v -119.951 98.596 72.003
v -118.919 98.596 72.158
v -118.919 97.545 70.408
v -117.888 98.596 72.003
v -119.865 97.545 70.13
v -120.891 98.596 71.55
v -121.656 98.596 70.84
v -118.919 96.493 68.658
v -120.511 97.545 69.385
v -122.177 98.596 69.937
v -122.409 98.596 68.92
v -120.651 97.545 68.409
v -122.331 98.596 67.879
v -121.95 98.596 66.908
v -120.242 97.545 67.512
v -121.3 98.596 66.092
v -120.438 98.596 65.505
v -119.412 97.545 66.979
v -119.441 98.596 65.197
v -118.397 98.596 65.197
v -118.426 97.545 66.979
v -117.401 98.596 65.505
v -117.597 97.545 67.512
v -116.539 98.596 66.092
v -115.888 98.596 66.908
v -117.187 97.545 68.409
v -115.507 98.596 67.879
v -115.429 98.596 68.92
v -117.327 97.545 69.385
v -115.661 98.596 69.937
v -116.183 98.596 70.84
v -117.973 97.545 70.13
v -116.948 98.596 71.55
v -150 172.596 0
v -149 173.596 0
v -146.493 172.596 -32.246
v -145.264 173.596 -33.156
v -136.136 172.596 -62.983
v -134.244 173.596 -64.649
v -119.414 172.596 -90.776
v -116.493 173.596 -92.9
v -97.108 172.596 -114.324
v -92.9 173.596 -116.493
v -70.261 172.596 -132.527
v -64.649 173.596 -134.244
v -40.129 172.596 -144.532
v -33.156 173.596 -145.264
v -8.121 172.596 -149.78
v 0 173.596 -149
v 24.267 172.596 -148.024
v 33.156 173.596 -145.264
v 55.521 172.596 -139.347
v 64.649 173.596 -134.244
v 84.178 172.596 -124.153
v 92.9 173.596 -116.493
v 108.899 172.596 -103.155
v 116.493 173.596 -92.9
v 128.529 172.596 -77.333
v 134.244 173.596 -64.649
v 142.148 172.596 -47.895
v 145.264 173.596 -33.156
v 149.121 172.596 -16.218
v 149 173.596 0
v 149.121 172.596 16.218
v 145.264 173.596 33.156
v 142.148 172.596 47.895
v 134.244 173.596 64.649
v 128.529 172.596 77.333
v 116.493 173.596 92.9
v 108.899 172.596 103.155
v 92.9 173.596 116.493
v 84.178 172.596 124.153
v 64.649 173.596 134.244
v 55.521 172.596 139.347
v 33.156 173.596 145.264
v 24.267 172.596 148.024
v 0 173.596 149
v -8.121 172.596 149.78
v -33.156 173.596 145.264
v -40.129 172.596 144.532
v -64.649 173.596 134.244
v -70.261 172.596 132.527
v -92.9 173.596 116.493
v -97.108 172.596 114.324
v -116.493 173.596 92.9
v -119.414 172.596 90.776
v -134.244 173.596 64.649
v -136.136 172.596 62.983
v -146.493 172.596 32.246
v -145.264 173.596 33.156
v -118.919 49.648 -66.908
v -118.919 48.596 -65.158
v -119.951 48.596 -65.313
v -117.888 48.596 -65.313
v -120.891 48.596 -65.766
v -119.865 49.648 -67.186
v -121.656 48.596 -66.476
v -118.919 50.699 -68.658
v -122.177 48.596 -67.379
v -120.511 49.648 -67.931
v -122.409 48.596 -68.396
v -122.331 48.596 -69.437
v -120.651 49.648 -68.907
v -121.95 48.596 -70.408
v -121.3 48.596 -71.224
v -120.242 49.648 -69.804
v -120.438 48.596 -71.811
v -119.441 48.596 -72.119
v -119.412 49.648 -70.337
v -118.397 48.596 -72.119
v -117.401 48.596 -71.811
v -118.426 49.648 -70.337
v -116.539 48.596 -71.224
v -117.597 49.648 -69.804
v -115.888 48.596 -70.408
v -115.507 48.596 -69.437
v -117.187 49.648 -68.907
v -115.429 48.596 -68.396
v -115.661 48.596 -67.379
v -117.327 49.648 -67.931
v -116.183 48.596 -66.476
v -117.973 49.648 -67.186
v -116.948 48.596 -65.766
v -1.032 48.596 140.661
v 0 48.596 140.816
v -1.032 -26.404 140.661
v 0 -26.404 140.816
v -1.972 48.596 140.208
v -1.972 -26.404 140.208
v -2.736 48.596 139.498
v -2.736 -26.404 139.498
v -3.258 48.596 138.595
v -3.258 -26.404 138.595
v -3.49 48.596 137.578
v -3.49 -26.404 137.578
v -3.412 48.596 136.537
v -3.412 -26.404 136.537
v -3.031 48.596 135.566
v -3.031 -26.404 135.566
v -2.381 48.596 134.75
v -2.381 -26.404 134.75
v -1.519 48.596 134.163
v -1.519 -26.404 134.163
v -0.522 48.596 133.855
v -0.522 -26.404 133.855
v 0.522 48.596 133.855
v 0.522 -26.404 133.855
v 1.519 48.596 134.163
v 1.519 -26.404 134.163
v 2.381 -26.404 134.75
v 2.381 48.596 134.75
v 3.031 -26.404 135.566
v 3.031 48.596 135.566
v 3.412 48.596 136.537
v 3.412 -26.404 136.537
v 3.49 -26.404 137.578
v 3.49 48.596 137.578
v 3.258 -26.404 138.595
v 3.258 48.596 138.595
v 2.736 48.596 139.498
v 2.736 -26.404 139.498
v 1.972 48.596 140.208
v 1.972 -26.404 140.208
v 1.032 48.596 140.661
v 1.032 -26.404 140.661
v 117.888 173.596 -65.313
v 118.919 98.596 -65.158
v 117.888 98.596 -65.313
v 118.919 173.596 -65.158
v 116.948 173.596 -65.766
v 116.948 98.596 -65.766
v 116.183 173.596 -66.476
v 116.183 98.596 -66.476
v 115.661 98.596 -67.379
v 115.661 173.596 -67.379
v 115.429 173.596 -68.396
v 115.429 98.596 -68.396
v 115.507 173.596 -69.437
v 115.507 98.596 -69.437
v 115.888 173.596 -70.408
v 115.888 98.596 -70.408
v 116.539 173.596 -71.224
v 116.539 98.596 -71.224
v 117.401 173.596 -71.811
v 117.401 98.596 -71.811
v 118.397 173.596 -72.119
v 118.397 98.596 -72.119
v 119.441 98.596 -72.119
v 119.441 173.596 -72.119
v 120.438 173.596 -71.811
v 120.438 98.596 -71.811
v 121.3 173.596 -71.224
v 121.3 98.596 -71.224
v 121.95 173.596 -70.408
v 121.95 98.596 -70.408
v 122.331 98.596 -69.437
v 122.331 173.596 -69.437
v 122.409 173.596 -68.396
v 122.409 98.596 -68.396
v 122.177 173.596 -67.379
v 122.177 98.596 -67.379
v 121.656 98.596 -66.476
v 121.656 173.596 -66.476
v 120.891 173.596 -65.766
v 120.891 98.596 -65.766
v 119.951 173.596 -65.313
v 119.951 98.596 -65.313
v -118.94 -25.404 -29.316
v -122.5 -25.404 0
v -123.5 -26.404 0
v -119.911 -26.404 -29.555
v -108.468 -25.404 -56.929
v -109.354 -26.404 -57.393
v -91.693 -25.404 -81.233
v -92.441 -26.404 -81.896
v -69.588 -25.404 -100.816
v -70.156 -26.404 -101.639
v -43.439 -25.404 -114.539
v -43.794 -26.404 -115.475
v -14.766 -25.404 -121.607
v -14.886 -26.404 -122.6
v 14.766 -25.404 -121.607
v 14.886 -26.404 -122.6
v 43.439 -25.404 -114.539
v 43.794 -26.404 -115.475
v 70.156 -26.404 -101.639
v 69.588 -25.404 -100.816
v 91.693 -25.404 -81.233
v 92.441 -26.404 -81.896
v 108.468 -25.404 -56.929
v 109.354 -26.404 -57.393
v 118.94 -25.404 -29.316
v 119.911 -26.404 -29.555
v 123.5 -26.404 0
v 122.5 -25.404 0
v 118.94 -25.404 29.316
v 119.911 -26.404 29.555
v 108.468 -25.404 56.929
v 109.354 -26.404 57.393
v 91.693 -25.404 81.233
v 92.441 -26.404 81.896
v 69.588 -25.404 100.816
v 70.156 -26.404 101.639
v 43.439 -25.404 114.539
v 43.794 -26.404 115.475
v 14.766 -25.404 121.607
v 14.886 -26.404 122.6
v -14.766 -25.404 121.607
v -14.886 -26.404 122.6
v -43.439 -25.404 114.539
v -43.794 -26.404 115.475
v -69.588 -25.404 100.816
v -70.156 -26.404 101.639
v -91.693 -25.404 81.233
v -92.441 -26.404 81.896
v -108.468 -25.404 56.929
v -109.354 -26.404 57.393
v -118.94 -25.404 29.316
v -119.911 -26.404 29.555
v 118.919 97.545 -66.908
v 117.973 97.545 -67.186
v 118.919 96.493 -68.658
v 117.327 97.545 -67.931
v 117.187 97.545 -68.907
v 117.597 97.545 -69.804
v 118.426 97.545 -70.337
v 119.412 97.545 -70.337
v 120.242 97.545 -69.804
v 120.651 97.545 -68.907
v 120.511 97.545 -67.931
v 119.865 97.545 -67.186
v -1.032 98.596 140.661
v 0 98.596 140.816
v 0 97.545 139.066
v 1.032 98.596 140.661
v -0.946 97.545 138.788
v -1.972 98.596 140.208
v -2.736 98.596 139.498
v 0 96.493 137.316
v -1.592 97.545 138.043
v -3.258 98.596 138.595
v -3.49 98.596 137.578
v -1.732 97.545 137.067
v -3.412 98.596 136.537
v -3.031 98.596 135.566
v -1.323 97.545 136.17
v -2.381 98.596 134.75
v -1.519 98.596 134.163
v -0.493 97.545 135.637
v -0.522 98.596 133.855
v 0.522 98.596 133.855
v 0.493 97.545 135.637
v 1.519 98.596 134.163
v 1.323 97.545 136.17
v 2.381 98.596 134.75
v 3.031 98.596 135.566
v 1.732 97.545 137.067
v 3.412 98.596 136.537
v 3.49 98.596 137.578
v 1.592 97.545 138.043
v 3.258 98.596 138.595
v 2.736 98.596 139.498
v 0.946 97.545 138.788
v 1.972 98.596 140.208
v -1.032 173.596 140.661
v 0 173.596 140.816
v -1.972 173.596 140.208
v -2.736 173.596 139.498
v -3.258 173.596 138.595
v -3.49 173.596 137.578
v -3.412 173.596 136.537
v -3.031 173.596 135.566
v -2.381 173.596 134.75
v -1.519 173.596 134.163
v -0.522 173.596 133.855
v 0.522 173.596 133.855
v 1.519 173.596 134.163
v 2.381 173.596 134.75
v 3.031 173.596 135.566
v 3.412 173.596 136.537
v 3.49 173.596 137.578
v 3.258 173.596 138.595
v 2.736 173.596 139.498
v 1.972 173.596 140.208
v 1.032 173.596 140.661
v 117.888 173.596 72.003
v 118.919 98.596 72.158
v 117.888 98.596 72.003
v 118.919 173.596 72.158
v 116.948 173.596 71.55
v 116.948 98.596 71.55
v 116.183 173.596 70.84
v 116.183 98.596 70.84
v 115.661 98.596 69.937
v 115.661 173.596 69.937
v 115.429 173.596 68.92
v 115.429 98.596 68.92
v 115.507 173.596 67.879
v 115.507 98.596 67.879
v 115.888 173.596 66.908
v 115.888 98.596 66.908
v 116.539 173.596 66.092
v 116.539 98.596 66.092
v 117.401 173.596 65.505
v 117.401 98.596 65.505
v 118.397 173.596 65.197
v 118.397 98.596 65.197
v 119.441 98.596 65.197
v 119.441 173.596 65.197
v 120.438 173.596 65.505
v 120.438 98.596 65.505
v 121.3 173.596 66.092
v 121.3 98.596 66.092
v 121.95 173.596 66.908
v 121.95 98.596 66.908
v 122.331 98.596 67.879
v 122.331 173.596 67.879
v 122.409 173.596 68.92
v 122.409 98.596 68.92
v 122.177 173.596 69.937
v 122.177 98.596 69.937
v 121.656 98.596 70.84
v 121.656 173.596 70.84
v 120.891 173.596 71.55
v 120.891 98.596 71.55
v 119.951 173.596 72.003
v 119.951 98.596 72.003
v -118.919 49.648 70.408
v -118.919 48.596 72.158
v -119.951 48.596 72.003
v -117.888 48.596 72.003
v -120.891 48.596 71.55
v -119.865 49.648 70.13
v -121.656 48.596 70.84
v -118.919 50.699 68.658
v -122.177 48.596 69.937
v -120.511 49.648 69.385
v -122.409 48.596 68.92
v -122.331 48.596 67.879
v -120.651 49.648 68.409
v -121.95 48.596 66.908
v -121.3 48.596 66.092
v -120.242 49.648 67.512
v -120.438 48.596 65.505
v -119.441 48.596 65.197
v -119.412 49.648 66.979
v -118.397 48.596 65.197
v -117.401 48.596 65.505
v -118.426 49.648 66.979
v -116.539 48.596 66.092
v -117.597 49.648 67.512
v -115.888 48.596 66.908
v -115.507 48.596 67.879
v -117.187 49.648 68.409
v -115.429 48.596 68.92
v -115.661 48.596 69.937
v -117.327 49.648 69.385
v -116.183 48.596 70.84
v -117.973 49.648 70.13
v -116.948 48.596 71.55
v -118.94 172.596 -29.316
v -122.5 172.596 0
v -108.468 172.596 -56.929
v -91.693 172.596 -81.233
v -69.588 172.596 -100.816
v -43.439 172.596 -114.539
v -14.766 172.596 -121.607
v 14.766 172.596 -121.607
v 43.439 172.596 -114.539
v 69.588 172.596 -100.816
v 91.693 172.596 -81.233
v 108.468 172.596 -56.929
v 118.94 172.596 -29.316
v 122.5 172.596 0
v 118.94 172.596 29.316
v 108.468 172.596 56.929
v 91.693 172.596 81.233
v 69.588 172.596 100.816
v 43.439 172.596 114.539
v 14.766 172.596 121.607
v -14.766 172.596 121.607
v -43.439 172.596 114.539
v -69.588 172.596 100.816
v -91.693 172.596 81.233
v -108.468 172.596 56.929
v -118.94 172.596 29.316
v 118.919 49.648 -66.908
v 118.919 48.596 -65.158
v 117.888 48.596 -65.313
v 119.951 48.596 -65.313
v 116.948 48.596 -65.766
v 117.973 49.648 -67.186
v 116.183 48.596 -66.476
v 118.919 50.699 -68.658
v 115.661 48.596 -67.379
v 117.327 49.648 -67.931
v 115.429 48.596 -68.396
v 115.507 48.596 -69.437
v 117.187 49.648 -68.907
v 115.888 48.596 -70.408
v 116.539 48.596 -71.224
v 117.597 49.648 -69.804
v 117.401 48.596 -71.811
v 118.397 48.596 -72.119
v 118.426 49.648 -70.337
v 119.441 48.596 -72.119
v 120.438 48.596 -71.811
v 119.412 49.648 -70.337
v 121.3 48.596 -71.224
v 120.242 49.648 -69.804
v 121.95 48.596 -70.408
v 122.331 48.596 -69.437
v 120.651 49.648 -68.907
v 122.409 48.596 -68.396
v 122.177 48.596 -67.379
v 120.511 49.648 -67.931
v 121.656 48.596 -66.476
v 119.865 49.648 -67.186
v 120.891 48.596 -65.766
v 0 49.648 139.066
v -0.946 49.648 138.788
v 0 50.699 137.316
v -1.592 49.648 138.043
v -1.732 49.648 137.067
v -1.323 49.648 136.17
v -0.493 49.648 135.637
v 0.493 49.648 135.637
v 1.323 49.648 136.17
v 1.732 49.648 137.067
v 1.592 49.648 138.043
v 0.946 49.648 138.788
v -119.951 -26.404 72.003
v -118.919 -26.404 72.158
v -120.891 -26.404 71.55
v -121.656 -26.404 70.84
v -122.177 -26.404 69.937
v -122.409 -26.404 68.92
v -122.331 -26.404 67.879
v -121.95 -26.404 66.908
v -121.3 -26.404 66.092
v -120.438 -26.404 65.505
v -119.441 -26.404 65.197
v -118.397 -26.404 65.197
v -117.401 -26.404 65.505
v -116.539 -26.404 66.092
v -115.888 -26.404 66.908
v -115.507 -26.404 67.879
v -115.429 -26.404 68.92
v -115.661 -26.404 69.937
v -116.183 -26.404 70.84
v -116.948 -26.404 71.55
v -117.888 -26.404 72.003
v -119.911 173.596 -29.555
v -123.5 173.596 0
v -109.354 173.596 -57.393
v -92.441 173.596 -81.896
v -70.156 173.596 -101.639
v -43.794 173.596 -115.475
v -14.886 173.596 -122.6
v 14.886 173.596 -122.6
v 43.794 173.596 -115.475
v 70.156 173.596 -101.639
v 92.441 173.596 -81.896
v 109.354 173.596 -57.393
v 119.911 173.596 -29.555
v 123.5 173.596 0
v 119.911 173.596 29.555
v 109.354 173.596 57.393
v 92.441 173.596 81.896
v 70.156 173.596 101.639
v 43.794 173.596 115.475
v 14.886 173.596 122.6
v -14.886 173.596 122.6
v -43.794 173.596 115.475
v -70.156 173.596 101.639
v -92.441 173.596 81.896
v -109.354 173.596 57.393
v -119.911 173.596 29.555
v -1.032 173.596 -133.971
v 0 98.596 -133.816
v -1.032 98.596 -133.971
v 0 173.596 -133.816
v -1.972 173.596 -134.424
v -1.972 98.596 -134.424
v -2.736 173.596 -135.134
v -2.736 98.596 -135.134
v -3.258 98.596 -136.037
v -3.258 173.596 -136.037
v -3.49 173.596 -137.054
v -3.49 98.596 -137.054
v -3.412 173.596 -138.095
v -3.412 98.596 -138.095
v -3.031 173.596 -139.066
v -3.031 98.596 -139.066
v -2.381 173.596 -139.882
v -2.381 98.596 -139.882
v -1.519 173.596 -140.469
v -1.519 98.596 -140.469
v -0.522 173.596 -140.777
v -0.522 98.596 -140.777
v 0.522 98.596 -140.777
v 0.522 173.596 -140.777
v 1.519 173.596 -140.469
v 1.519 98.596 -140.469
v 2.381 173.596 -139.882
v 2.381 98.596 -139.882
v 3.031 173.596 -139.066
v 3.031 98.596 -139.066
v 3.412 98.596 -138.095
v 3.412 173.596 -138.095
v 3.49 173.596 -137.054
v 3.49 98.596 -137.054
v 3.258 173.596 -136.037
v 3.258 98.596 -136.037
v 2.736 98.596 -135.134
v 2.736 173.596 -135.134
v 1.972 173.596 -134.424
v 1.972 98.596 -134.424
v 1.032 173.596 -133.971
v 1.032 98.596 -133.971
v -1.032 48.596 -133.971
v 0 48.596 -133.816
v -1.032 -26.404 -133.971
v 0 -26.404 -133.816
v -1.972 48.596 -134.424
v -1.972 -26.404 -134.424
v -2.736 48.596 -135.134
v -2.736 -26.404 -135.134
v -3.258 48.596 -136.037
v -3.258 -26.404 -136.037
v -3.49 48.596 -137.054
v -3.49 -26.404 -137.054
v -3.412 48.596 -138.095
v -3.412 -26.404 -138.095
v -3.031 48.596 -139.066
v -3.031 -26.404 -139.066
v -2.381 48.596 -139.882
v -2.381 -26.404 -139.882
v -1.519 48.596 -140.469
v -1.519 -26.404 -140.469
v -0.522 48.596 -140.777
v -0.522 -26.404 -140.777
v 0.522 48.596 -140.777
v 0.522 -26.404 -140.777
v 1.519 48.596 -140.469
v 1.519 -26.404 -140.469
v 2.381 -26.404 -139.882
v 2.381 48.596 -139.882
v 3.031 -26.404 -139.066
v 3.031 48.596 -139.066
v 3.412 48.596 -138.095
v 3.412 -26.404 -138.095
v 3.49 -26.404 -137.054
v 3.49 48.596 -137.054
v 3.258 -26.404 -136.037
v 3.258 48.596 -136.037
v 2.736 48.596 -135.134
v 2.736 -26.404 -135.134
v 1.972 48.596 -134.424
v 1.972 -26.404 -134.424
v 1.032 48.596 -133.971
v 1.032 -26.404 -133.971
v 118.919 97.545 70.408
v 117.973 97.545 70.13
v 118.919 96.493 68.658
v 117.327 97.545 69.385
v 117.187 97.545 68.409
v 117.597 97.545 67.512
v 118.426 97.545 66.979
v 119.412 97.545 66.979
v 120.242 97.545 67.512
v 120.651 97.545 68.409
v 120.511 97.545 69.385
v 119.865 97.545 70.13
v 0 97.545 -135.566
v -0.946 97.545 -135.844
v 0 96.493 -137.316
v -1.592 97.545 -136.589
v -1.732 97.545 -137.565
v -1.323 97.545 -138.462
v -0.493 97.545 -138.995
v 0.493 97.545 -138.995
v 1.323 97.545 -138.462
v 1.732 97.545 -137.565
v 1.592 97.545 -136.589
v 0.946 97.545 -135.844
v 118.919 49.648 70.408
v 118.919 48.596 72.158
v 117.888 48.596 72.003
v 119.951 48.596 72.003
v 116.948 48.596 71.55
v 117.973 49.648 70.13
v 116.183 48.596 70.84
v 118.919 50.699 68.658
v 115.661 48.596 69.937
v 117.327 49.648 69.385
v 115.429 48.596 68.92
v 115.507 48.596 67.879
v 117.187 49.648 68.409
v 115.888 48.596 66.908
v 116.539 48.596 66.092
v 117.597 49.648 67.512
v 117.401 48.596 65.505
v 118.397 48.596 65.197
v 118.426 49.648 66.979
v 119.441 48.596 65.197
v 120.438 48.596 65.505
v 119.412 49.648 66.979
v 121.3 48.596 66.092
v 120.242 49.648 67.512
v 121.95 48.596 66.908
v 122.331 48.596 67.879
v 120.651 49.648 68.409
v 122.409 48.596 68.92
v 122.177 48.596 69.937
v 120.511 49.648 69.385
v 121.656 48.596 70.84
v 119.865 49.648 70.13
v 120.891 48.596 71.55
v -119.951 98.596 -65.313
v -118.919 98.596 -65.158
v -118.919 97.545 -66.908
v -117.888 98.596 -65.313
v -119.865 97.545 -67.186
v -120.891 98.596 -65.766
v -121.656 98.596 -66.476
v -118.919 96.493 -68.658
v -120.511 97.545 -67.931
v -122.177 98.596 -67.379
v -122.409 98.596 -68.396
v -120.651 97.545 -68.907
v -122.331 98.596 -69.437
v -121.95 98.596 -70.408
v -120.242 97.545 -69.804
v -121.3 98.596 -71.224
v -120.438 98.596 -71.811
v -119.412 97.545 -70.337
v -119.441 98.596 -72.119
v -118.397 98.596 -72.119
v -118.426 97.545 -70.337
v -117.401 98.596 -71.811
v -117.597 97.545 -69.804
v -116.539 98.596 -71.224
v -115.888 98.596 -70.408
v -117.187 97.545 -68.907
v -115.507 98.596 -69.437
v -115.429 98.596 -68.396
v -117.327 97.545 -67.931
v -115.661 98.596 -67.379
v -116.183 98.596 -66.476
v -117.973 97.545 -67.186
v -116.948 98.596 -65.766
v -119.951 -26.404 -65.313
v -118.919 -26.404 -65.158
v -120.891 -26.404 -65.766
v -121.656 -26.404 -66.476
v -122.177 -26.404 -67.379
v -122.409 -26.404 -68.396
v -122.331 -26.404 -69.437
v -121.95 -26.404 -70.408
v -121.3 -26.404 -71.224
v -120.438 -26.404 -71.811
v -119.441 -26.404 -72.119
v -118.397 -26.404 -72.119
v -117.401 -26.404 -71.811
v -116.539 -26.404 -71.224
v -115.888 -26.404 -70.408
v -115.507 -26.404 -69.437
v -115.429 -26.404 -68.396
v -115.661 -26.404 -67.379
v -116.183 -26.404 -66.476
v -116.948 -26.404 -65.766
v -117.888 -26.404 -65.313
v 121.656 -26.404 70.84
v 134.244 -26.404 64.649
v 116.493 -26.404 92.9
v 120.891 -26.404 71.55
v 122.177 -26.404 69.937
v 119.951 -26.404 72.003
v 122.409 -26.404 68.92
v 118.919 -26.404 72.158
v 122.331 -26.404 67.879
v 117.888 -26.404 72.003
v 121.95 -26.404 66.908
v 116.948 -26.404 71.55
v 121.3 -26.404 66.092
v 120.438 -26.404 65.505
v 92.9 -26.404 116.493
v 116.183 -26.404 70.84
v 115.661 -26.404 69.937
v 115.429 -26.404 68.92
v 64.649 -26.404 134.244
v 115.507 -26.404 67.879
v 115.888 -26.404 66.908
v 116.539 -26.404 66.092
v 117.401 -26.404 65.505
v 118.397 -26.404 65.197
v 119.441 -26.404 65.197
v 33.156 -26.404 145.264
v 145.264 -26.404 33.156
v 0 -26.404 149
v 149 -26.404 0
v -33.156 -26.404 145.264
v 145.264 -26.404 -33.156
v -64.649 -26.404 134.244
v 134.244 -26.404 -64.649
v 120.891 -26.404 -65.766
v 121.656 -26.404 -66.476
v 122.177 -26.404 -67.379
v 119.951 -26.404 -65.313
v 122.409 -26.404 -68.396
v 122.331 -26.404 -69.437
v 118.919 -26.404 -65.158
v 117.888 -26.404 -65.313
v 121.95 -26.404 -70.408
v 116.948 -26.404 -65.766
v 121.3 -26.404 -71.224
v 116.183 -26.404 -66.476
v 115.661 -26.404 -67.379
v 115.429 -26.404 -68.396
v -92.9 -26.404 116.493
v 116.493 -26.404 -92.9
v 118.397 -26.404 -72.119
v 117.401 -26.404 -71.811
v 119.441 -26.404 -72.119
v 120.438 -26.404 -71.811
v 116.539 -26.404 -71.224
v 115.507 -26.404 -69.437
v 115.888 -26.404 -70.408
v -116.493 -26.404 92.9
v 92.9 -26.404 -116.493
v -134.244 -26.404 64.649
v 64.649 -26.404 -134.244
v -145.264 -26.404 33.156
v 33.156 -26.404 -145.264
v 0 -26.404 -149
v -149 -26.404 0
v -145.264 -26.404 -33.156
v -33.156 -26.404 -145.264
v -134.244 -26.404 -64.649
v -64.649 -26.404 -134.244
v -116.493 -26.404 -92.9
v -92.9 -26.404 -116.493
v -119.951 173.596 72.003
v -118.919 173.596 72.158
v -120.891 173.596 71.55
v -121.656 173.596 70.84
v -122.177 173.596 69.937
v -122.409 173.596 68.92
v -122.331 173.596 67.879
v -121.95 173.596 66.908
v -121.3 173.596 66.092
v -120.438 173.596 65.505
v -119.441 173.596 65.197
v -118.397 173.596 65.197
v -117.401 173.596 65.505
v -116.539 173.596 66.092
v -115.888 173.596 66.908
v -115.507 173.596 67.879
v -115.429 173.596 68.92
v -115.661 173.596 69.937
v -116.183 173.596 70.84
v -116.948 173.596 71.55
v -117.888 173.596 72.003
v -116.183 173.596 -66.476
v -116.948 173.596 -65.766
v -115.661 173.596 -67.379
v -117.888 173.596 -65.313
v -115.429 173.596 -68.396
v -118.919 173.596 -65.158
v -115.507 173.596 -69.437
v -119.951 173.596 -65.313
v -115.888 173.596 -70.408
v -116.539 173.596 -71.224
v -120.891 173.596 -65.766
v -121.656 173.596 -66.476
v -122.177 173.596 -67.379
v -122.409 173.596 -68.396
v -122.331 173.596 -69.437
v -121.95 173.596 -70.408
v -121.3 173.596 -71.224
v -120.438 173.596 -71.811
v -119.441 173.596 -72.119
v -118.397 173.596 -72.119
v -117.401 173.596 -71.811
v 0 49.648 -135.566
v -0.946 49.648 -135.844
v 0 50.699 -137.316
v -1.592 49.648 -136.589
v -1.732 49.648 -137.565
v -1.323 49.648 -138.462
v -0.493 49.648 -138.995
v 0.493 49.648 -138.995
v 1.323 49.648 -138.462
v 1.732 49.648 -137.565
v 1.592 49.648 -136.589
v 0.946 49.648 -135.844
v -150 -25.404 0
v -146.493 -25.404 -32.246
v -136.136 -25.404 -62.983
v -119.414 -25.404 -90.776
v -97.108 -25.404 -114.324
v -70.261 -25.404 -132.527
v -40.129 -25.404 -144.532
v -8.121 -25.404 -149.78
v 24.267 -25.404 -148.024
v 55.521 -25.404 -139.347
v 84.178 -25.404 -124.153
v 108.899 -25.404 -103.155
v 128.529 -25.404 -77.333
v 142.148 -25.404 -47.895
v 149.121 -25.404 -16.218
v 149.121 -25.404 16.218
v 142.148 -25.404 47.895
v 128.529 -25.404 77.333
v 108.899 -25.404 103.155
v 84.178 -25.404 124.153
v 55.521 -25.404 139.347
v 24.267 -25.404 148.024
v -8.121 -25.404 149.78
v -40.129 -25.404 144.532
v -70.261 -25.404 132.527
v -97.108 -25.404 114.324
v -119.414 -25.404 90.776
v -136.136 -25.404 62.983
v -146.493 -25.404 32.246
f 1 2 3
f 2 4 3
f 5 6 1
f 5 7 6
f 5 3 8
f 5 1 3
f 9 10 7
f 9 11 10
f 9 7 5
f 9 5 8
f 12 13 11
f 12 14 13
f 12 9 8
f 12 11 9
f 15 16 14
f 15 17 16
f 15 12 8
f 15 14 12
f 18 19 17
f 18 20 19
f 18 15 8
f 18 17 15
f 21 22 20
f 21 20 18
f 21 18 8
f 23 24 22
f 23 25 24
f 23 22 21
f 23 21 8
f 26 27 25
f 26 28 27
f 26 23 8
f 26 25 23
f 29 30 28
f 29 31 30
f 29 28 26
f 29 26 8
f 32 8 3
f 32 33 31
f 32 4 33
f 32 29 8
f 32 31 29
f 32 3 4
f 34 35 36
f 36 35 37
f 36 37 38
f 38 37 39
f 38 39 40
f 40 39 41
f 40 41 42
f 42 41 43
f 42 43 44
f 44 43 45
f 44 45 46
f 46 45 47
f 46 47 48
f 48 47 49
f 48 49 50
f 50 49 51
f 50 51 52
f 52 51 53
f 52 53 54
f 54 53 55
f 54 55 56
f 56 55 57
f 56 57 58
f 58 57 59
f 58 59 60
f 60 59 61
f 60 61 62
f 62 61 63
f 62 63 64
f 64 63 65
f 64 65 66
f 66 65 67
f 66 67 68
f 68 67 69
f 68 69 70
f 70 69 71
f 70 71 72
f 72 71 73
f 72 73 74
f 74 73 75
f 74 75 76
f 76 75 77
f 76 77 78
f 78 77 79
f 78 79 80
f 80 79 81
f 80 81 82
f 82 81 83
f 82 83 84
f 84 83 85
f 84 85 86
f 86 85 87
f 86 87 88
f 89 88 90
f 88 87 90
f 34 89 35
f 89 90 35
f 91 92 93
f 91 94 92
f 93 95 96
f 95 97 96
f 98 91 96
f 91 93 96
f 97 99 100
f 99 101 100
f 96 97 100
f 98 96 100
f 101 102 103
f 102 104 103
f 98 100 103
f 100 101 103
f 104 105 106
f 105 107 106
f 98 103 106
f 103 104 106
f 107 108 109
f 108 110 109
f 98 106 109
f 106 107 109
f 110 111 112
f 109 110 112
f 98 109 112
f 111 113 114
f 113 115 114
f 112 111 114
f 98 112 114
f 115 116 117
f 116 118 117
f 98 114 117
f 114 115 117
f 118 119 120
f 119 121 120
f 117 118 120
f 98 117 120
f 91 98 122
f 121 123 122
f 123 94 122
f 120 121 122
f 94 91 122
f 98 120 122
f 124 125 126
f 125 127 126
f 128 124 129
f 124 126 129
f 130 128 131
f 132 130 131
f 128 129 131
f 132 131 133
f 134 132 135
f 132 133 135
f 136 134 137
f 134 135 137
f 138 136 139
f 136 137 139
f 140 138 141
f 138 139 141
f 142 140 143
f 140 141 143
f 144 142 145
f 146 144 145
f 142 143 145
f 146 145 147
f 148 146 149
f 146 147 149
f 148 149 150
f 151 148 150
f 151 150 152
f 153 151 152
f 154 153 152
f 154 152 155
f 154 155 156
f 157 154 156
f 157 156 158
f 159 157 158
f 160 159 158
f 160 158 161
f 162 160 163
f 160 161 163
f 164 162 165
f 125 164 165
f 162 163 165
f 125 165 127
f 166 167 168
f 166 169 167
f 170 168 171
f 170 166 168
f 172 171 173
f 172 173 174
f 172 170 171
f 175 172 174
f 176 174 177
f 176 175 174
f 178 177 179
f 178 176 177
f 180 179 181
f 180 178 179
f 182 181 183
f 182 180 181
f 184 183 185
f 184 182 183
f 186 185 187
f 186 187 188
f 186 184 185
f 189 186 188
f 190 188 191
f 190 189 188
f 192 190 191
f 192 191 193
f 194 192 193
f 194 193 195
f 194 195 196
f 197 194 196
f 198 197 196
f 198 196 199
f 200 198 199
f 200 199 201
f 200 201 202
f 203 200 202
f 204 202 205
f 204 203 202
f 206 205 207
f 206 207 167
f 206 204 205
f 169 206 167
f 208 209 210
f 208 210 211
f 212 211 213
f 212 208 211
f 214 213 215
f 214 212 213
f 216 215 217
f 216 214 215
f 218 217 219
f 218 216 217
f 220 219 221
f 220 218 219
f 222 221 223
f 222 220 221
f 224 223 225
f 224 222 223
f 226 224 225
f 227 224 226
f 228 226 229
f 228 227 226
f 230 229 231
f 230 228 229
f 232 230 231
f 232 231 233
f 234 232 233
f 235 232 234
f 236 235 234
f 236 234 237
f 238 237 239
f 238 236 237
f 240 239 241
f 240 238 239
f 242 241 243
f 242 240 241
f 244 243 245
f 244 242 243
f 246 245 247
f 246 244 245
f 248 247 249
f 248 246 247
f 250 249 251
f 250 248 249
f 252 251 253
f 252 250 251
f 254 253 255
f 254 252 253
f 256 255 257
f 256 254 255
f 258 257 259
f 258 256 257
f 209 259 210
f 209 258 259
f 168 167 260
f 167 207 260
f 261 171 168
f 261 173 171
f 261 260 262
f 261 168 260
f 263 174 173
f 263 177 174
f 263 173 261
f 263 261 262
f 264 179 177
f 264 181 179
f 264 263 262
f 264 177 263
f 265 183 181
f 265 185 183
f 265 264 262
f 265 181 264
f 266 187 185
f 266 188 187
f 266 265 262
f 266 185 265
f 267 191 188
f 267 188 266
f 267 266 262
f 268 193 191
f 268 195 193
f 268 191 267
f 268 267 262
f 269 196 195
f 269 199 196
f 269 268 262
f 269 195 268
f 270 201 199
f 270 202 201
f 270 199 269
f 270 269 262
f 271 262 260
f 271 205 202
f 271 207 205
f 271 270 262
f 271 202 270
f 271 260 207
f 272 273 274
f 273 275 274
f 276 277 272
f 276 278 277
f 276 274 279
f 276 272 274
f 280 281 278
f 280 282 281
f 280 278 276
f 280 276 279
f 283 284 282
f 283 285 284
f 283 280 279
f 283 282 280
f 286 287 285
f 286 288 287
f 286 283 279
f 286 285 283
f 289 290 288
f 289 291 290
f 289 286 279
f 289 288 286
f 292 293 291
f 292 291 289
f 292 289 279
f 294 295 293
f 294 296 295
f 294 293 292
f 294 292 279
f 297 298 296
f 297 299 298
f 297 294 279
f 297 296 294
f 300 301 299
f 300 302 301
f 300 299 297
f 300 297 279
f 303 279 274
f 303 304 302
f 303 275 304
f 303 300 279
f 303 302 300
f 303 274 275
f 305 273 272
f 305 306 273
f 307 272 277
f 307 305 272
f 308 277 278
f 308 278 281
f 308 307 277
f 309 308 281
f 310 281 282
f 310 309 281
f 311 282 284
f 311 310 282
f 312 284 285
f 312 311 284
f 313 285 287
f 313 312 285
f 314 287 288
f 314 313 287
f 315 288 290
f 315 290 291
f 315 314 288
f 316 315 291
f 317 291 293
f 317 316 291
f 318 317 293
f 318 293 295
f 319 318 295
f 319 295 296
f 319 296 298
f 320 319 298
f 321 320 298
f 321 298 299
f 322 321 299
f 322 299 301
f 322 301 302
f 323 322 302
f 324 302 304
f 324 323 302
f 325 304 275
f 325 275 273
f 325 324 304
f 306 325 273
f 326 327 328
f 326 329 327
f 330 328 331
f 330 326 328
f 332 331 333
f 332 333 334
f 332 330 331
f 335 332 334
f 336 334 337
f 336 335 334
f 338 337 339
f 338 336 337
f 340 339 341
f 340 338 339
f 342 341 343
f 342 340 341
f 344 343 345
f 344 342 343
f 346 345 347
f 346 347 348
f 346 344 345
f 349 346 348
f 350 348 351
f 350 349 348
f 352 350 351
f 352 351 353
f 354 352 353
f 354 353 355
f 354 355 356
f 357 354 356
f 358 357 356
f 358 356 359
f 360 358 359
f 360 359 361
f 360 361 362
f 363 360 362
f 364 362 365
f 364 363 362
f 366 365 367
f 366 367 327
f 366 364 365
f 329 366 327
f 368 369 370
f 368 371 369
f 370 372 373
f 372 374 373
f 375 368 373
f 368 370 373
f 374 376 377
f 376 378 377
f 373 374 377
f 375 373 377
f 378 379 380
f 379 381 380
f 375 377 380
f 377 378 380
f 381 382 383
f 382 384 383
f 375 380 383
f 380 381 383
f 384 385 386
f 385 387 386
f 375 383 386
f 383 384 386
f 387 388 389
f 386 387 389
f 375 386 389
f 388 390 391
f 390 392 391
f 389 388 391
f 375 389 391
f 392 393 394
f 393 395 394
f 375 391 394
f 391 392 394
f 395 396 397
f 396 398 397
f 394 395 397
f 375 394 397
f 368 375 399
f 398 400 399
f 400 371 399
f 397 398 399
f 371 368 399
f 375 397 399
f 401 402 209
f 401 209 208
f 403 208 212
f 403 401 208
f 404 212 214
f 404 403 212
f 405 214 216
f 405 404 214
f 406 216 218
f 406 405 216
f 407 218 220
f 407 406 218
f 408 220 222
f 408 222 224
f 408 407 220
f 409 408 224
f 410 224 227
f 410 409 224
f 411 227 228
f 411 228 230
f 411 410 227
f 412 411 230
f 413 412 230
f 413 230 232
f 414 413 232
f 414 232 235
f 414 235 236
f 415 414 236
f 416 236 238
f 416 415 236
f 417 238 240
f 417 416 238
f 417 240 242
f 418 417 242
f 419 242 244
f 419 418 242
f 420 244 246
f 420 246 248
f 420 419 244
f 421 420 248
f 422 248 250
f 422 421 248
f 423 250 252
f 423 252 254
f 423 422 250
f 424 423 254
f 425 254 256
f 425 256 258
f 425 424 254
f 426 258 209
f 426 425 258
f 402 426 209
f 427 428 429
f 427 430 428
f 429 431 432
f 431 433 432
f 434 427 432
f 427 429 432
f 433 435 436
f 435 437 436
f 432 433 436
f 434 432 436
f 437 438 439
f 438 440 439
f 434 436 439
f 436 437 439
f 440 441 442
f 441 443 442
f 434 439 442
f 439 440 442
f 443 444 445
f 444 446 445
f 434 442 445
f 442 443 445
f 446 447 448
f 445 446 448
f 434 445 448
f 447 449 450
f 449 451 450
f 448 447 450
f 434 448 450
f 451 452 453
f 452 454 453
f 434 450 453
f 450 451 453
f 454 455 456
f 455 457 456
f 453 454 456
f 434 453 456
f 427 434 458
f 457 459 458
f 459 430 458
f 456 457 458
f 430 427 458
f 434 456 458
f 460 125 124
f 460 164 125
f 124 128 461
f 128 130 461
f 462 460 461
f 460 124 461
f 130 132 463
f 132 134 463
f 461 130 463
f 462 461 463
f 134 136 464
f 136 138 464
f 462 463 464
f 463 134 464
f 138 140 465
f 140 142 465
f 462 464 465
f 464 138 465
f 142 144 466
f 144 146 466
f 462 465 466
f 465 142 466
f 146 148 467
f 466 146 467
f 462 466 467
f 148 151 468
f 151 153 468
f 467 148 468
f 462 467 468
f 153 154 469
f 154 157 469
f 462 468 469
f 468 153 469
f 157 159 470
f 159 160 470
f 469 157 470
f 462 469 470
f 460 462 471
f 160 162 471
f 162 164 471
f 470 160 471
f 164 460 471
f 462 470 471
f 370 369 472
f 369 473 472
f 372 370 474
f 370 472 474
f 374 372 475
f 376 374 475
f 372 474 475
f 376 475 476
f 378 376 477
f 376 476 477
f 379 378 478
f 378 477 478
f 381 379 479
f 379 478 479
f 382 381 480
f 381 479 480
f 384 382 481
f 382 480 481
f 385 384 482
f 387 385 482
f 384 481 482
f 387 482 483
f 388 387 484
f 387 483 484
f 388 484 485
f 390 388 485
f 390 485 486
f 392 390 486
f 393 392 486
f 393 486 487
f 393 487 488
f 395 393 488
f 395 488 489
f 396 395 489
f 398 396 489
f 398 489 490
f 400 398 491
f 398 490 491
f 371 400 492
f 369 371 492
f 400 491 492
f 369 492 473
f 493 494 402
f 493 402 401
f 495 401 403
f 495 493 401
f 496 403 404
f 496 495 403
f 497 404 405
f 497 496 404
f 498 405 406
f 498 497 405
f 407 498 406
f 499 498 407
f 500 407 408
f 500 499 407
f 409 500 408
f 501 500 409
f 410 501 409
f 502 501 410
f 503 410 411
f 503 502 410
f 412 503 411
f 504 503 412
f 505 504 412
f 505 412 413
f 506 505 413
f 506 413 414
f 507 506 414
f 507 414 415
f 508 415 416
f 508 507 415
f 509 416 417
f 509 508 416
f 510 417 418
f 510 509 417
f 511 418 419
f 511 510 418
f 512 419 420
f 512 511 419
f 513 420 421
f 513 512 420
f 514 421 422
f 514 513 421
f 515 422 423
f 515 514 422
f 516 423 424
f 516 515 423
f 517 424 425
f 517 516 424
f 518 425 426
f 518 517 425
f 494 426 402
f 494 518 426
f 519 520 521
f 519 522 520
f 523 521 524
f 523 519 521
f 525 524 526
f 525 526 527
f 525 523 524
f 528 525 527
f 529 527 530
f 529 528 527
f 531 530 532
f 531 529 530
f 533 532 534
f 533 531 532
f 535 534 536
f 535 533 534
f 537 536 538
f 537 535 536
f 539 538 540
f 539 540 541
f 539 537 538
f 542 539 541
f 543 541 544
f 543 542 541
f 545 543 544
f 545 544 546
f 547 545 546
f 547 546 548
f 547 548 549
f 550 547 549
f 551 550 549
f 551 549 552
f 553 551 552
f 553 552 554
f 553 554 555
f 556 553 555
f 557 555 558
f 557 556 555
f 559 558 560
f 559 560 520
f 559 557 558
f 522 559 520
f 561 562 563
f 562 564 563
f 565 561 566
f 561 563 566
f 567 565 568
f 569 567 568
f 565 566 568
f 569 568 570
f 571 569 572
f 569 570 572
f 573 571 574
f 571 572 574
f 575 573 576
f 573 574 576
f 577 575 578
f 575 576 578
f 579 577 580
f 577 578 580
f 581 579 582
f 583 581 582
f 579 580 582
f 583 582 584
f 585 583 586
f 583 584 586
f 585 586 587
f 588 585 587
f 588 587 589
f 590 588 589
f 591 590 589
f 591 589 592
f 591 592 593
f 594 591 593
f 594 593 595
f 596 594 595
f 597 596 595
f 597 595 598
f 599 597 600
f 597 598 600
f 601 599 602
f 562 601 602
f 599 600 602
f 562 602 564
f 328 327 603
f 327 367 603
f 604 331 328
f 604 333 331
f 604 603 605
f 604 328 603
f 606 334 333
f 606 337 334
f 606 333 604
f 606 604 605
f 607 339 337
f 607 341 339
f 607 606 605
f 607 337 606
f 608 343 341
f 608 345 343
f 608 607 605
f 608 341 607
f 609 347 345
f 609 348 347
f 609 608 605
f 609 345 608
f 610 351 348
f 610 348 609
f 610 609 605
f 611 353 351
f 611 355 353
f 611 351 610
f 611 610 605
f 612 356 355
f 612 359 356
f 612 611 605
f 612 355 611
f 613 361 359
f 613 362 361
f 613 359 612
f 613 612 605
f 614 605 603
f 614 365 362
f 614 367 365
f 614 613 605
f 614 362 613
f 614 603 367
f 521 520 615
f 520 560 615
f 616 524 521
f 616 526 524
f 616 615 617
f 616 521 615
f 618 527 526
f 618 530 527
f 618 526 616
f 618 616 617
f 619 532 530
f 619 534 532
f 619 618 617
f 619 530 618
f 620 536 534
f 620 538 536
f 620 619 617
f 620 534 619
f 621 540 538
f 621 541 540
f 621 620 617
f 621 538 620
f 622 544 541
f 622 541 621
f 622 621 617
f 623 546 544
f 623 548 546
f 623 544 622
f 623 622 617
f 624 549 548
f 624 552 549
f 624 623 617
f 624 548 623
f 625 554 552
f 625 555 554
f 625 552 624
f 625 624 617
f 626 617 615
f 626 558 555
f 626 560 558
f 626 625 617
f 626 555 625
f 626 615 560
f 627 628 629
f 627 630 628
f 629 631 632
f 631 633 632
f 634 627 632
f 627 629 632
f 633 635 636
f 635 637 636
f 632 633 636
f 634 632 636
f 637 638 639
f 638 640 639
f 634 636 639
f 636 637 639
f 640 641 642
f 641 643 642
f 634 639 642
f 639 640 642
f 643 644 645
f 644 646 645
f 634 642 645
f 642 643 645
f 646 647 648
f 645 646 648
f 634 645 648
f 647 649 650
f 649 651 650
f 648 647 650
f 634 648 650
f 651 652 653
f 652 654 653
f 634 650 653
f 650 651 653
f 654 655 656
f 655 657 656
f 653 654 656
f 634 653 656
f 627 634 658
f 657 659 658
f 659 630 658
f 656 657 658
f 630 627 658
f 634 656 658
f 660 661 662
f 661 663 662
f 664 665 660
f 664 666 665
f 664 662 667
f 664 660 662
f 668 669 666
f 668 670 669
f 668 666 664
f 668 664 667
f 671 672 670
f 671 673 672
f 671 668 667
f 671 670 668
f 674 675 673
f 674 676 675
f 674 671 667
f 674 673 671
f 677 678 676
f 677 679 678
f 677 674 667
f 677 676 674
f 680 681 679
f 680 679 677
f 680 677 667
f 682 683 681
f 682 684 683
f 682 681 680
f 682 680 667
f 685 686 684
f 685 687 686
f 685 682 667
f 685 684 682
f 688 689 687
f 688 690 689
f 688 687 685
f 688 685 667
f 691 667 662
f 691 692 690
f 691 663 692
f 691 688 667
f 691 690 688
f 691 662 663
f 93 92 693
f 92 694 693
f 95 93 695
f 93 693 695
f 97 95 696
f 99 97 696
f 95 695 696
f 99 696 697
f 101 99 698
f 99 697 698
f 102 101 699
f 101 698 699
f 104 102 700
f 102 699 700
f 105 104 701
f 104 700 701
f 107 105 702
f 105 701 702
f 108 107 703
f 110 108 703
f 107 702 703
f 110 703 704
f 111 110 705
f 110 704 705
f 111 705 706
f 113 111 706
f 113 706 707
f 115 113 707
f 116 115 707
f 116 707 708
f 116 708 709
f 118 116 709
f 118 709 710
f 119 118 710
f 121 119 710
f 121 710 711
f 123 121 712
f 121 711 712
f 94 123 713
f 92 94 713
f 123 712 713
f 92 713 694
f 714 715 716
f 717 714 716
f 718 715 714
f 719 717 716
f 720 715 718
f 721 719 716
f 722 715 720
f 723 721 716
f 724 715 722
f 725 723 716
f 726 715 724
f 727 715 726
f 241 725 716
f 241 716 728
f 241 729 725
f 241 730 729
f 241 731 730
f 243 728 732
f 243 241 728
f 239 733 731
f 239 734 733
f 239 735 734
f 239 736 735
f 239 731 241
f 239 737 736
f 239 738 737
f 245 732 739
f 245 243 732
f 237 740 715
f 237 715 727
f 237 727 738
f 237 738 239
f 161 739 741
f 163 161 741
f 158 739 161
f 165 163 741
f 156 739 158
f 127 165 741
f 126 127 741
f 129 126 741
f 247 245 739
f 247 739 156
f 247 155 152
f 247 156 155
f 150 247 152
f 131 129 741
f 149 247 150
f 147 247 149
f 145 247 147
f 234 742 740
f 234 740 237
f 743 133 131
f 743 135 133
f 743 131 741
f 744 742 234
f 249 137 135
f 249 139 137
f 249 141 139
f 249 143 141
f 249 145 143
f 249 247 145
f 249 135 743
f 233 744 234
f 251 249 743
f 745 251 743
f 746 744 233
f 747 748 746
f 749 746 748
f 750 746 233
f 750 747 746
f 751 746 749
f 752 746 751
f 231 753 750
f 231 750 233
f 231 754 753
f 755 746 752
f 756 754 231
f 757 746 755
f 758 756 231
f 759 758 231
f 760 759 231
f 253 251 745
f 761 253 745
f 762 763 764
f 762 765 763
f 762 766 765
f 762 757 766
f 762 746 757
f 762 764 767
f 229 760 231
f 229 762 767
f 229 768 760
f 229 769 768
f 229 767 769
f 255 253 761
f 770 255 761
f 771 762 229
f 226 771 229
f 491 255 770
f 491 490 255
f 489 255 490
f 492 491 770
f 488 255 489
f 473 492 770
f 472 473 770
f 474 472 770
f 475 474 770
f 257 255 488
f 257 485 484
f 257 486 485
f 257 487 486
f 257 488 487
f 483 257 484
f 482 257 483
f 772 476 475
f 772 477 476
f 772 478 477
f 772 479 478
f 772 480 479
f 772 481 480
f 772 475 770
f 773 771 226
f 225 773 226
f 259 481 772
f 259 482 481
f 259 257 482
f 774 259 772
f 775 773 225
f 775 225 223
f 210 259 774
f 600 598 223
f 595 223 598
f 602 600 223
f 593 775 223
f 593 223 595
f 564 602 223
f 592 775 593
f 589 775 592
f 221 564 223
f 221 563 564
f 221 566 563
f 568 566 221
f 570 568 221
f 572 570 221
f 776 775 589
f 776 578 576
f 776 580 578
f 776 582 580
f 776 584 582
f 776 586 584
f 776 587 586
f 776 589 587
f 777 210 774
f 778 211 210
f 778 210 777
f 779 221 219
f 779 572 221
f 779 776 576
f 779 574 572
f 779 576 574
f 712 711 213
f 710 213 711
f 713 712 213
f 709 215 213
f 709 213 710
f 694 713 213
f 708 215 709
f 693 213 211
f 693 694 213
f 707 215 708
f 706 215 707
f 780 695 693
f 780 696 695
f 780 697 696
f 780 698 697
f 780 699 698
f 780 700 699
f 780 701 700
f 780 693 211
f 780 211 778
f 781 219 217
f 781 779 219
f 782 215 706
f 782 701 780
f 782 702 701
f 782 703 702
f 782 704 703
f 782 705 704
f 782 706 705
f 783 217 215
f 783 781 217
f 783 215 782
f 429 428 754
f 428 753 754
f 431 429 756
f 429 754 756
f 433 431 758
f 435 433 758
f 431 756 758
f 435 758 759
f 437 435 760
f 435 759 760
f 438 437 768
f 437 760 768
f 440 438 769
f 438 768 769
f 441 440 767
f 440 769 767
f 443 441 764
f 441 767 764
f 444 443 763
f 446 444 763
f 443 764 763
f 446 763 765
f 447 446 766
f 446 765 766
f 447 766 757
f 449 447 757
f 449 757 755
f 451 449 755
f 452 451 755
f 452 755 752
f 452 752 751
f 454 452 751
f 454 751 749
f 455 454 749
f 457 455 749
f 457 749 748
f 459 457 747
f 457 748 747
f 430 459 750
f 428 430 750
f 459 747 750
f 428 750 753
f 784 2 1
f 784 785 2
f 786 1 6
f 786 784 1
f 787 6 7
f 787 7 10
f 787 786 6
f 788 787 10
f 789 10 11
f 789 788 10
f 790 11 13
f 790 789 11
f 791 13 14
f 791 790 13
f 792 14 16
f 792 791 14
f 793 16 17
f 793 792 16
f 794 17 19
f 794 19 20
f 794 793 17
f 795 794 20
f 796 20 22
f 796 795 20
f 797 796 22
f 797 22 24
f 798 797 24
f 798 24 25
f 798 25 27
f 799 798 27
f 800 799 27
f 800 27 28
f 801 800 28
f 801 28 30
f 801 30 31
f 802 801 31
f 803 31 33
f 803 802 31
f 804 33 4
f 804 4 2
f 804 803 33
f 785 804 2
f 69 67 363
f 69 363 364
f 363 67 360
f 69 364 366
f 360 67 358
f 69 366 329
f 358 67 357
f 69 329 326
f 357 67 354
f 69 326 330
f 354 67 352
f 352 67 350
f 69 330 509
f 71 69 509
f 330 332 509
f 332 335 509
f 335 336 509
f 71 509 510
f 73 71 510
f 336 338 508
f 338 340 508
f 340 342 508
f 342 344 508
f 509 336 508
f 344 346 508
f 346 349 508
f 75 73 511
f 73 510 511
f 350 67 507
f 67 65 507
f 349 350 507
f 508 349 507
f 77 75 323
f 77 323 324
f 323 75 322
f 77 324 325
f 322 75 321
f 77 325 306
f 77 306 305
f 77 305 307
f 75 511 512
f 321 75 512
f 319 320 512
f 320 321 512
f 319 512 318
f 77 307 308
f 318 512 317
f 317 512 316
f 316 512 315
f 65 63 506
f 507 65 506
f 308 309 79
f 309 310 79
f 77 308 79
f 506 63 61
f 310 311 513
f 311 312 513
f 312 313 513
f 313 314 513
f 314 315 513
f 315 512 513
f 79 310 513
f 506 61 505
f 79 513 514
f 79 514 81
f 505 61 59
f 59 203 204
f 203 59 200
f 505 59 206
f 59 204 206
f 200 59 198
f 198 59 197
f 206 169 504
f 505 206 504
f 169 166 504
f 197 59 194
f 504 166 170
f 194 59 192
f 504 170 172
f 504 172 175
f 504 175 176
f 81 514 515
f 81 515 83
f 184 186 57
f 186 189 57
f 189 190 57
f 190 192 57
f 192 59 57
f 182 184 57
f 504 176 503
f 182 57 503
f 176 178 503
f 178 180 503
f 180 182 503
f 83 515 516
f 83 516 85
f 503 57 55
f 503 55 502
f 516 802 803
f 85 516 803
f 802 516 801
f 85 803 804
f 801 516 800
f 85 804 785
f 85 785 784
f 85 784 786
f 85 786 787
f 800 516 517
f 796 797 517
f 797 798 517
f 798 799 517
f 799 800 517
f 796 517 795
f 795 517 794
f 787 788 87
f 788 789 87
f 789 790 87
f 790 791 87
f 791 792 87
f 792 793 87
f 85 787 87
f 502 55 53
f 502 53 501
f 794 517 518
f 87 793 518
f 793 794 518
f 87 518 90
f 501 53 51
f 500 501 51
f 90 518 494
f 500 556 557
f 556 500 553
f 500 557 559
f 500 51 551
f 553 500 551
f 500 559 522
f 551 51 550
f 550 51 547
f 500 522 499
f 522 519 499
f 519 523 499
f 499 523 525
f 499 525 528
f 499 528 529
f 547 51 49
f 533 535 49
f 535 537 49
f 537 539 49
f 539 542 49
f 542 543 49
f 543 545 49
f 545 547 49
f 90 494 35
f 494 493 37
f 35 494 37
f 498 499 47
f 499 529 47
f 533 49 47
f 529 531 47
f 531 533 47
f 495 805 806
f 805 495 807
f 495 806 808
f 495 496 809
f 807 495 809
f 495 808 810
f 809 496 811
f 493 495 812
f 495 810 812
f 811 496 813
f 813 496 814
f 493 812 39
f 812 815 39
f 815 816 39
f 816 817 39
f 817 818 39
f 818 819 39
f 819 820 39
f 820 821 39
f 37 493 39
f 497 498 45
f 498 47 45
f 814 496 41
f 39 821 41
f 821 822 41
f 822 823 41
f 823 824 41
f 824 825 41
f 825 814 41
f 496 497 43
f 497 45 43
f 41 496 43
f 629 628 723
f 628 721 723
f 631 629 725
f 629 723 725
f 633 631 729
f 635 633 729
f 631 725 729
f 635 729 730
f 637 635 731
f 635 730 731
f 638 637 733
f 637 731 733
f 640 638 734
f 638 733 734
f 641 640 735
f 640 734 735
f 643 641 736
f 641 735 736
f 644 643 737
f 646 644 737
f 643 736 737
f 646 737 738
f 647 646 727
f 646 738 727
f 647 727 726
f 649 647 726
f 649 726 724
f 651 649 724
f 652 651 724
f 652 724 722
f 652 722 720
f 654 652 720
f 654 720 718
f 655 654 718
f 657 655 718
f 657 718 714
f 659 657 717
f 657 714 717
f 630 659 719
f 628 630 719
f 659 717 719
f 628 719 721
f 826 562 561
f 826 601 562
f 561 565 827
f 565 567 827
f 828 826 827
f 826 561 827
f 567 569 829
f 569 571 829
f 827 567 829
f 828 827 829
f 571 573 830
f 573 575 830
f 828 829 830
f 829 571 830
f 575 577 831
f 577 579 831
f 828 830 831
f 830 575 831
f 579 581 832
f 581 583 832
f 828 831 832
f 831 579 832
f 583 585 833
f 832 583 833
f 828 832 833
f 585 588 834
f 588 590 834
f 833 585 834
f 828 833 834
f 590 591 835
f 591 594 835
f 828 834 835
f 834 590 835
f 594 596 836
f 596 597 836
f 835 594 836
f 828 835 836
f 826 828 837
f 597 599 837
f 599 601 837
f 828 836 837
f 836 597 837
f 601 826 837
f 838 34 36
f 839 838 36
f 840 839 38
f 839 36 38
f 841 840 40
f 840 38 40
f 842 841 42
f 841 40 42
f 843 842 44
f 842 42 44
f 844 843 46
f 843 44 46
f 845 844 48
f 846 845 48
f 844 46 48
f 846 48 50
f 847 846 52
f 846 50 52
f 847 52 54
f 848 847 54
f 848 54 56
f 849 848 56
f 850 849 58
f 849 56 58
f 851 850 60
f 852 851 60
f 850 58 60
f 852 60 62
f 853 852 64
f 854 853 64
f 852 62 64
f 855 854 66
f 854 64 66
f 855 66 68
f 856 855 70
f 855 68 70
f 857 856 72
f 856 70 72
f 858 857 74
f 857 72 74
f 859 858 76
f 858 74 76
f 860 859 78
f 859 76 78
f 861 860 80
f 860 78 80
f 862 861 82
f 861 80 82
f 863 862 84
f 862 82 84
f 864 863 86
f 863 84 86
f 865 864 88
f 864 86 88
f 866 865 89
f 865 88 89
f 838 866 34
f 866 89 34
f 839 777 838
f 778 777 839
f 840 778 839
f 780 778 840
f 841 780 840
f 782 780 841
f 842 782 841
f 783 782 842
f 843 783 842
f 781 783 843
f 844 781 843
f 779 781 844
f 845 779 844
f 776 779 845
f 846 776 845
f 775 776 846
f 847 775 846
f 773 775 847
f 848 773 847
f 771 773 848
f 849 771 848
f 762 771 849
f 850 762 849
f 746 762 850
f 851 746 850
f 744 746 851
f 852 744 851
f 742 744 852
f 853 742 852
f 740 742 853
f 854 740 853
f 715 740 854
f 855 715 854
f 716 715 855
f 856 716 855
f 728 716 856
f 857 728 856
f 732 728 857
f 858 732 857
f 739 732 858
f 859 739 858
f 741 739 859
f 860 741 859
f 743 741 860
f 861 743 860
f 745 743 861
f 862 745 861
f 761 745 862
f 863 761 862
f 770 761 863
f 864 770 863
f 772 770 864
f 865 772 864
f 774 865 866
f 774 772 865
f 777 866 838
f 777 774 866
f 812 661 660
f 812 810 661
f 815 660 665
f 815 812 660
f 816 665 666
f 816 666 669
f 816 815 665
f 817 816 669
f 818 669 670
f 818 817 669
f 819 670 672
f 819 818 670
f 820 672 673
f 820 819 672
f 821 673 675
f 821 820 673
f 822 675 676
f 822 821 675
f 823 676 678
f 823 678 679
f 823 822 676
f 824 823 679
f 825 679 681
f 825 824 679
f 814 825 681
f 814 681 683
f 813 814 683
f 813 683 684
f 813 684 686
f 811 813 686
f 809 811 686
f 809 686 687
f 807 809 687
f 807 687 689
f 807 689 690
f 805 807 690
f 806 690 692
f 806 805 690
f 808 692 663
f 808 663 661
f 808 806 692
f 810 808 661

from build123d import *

# Parameters (mm, degrees)
SZKIC1_W                            = 27.5
SZKIC1_H                            = 200
SFAZOWANIE1_SIZE                    = 1
OTW_R_GWINTOWANY_M8X1_01_AT_2_COUNT = 2
OTW_R_GWINTOWANY_M8X1_01_AT_2_PITCH = 137.316
OTW_R_GWINTOWANY_M8X1_01_AT_3_COUNT = 2
OTW_R_GWINTOWANY_M8X1_01_AT_3_PITCH = 237.838288692
OTW_R_GWINTOWANY_M8X1_01_AT_4_COUNT = 2
OTW_R_GWINTOWANY_M8X1_01_AT_4_PITCH = 274.632
OTW_R_GWINTOWANY_M8X1_01_AT_5_COUNT = 2
OTW_R_GWINTOWANY_M8X1_01_AT_5_PITCH = 237.838288692
OTW_R_GWINTOWANY_M8X1_01_AT_6_COUNT = 2
OTW_R_GWINTOWANY_M8X1_01_AT_6_PITCH = 137.316


with BuildPart() as part:
    # Szkic1 → Obrót1 (revolve)
    with BuildSketch(Plane.XY):
        with Locations((-136.25, 73.59625624)):
            Rectangle(SZKIC1_W, SZKIC1_H)
    revolve(axis=Axis((0, 193.59625624, 0), (0, -1, 0)))

    # Sfazowanie1
    sfazowanie1_edges = [part.edges().sort_by_distance(p)[0] for p in [
        (150, 173.59625624, 0),
        (122.5, 173.59625624, 0),
        (122.5, -26.40374376, 0),
        (150, -26.40374376, 0),
    ]]
    chamfer(sfazowanie1_edges, length=SFAZOWANIE1_SIZE)

    # Szkic7 → Otwór gwintowany M8x1.01 (revolve, cut)
    with BuildSketch(Plane(origin=(0, 173.59625624, -137.316), x_dir=(0, 0, 1), z_dir=(1, 0, 0))):
        Polygon((0, 0), (0, 77.103012167), (3.5, 75), (3.5, 0), align=None)
    otw_r_gwintowany_m8x1_01 = revolve(axis=Axis((0, 179.94625624, -137.316), (0, -1, 0)), mode=Mode.SUBTRACT)

    # Otwór gwintowany M8x1.01 at 2: Otwór gwintowany M8x1.01 ×2
    with Locations(*[Vector(0.8660254037844388, 0, 0.49999999999999983) * (i * OTW_R_GWINTOWANY_M8X1_01_AT_2_PITCH) for i in range(1, OTW_R_GWINTOWANY_M8X1_01_AT_2_COUNT)]):
        add(otw_r_gwintowany_m8x1_01, mode=Mode.SUBTRACT)

    # Otwór gwintowany M8x1.01 at 3: Otwór gwintowany M8x1.01 ×2
    with Locations(*[Vector(0.5000000000000001, 0, 0.8660254037844386) * (i * OTW_R_GWINTOWANY_M8X1_01_AT_3_PITCH) for i in range(1, OTW_R_GWINTOWANY_M8X1_01_AT_3_COUNT)]):
        add(otw_r_gwintowany_m8x1_01, mode=Mode.SUBTRACT)

    # Otwór gwintowany M8x1.01 at 4: Otwór gwintowany M8x1.01 ×2
    with Locations(*[(0, 0, i * OTW_R_GWINTOWANY_M8X1_01_AT_4_PITCH) for i in range(1, OTW_R_GWINTOWANY_M8X1_01_AT_4_COUNT)]):
        add(otw_r_gwintowany_m8x1_01, mode=Mode.SUBTRACT)

    # Otwór gwintowany M8x1.01 at 5: Otwór gwintowany M8x1.01 ×2
    with Locations(*[Vector(-0.49999999999999967, 0, 0.8660254037844388) * (i * OTW_R_GWINTOWANY_M8X1_01_AT_5_PITCH) for i in range(1, OTW_R_GWINTOWANY_M8X1_01_AT_5_COUNT)]):
        add(otw_r_gwintowany_m8x1_01, mode=Mode.SUBTRACT)

    # Otwór gwintowany M8x1.01 at 6: Otwór gwintowany M8x1.01 ×2
    with Locations(*[Vector(-0.8660254037844386, 0, 0.5000000000000002) * (i * OTW_R_GWINTOWANY_M8X1_01_AT_6_PITCH) for i in range(1, OTW_R_GWINTOWANY_M8X1_01_AT_6_COUNT)]):
        add(otw_r_gwintowany_m8x1_01, mode=Mode.SUBTRACT)

    # Lustro2: Otwór gwintowany M8x1.01 across plane
    add(otw_r_gwintowany_m8x1_01.mirror(Plane.ZX.offset(73.59625624)), mode=Mode.SUBTRACT)

    # Lustro2 copy 1 sketch → Lustro2 copy 1 (revolve, cut)
    with BuildSketch(Plane(origin=(118.919144346, -26.40374376, -68.658), x_dir=(0, 0, 1), z_dir=(1, 0, 0))):
        Polygon((0, 0), (0, -77.103012167), (3.5, -75), (3.5, 0), align=None)
    revolve(axis=Axis((118.919144346, -32.75374376, -68.658), (0, -1, 0)), mode=Mode.SUBTRACT)

    # Lustro2 copy 2 sketch → Lustro2 copy 2 (revolve, cut)
    with BuildSketch(Plane(origin=(118.919144346, -26.40374376, 68.658), x_dir=(0, 0, 1), z_dir=(1, 0, 0))):
        Polygon((0, 0), (0, -77.103012167), (3.5, -75), (3.5, 0), align=None)
    revolve(axis=Axis((118.919144346, -32.75374376, 68.658), (0, -1, 0)), mode=Mode.SUBTRACT)

    # Lustro2 copy 3 sketch → Lustro2 copy 3 (revolve, cut)
    with BuildSketch(Plane(origin=(0, -26.40374376, 137.316), x_dir=(0, 0, 1), z_dir=(1, 0, 0))):
        Polygon((0, 0), (0, -77.103012167), (3.5, -75), (3.5, 0), align=None)
    revolve(axis=Axis((0, -32.75374376, 137.316), (0, -1, 0)), mode=Mode.SUBTRACT)

    # Lustro2 copy 4 sketch → Lustro2 copy 4 (revolve, cut)
    with BuildSketch(Plane(origin=(-118.919144346, -26.40374376, 68.658), x_dir=(0, 0, 1), z_dir=(1, 0, 0))):
        Polygon((0, 0), (0, -77.103012167), (3.5, -75), (3.5, 0), align=None)
    revolve(axis=Axis((-118.919144346, -32.75374376, 68.658), (0, -1, 0)), mode=Mode.SUBTRACT)

    # Lustro2 copy 5 sketch → Lustro2 copy 5 (revolve, cut)
    with BuildSketch(Plane(origin=(-118.919144346, -26.40374376, -68.658), x_dir=(0, 0, 1), z_dir=(1, 0, 0))):
        Polygon((0, 0), (0, -77.103012167), (3.5, -75), (3.5, 0), align=None)
    revolve(axis=Axis((-118.919144346, -32.75374376, -68.658), (0, -1, 0)), mode=Mode.SUBTRACT)


solid = part.part
